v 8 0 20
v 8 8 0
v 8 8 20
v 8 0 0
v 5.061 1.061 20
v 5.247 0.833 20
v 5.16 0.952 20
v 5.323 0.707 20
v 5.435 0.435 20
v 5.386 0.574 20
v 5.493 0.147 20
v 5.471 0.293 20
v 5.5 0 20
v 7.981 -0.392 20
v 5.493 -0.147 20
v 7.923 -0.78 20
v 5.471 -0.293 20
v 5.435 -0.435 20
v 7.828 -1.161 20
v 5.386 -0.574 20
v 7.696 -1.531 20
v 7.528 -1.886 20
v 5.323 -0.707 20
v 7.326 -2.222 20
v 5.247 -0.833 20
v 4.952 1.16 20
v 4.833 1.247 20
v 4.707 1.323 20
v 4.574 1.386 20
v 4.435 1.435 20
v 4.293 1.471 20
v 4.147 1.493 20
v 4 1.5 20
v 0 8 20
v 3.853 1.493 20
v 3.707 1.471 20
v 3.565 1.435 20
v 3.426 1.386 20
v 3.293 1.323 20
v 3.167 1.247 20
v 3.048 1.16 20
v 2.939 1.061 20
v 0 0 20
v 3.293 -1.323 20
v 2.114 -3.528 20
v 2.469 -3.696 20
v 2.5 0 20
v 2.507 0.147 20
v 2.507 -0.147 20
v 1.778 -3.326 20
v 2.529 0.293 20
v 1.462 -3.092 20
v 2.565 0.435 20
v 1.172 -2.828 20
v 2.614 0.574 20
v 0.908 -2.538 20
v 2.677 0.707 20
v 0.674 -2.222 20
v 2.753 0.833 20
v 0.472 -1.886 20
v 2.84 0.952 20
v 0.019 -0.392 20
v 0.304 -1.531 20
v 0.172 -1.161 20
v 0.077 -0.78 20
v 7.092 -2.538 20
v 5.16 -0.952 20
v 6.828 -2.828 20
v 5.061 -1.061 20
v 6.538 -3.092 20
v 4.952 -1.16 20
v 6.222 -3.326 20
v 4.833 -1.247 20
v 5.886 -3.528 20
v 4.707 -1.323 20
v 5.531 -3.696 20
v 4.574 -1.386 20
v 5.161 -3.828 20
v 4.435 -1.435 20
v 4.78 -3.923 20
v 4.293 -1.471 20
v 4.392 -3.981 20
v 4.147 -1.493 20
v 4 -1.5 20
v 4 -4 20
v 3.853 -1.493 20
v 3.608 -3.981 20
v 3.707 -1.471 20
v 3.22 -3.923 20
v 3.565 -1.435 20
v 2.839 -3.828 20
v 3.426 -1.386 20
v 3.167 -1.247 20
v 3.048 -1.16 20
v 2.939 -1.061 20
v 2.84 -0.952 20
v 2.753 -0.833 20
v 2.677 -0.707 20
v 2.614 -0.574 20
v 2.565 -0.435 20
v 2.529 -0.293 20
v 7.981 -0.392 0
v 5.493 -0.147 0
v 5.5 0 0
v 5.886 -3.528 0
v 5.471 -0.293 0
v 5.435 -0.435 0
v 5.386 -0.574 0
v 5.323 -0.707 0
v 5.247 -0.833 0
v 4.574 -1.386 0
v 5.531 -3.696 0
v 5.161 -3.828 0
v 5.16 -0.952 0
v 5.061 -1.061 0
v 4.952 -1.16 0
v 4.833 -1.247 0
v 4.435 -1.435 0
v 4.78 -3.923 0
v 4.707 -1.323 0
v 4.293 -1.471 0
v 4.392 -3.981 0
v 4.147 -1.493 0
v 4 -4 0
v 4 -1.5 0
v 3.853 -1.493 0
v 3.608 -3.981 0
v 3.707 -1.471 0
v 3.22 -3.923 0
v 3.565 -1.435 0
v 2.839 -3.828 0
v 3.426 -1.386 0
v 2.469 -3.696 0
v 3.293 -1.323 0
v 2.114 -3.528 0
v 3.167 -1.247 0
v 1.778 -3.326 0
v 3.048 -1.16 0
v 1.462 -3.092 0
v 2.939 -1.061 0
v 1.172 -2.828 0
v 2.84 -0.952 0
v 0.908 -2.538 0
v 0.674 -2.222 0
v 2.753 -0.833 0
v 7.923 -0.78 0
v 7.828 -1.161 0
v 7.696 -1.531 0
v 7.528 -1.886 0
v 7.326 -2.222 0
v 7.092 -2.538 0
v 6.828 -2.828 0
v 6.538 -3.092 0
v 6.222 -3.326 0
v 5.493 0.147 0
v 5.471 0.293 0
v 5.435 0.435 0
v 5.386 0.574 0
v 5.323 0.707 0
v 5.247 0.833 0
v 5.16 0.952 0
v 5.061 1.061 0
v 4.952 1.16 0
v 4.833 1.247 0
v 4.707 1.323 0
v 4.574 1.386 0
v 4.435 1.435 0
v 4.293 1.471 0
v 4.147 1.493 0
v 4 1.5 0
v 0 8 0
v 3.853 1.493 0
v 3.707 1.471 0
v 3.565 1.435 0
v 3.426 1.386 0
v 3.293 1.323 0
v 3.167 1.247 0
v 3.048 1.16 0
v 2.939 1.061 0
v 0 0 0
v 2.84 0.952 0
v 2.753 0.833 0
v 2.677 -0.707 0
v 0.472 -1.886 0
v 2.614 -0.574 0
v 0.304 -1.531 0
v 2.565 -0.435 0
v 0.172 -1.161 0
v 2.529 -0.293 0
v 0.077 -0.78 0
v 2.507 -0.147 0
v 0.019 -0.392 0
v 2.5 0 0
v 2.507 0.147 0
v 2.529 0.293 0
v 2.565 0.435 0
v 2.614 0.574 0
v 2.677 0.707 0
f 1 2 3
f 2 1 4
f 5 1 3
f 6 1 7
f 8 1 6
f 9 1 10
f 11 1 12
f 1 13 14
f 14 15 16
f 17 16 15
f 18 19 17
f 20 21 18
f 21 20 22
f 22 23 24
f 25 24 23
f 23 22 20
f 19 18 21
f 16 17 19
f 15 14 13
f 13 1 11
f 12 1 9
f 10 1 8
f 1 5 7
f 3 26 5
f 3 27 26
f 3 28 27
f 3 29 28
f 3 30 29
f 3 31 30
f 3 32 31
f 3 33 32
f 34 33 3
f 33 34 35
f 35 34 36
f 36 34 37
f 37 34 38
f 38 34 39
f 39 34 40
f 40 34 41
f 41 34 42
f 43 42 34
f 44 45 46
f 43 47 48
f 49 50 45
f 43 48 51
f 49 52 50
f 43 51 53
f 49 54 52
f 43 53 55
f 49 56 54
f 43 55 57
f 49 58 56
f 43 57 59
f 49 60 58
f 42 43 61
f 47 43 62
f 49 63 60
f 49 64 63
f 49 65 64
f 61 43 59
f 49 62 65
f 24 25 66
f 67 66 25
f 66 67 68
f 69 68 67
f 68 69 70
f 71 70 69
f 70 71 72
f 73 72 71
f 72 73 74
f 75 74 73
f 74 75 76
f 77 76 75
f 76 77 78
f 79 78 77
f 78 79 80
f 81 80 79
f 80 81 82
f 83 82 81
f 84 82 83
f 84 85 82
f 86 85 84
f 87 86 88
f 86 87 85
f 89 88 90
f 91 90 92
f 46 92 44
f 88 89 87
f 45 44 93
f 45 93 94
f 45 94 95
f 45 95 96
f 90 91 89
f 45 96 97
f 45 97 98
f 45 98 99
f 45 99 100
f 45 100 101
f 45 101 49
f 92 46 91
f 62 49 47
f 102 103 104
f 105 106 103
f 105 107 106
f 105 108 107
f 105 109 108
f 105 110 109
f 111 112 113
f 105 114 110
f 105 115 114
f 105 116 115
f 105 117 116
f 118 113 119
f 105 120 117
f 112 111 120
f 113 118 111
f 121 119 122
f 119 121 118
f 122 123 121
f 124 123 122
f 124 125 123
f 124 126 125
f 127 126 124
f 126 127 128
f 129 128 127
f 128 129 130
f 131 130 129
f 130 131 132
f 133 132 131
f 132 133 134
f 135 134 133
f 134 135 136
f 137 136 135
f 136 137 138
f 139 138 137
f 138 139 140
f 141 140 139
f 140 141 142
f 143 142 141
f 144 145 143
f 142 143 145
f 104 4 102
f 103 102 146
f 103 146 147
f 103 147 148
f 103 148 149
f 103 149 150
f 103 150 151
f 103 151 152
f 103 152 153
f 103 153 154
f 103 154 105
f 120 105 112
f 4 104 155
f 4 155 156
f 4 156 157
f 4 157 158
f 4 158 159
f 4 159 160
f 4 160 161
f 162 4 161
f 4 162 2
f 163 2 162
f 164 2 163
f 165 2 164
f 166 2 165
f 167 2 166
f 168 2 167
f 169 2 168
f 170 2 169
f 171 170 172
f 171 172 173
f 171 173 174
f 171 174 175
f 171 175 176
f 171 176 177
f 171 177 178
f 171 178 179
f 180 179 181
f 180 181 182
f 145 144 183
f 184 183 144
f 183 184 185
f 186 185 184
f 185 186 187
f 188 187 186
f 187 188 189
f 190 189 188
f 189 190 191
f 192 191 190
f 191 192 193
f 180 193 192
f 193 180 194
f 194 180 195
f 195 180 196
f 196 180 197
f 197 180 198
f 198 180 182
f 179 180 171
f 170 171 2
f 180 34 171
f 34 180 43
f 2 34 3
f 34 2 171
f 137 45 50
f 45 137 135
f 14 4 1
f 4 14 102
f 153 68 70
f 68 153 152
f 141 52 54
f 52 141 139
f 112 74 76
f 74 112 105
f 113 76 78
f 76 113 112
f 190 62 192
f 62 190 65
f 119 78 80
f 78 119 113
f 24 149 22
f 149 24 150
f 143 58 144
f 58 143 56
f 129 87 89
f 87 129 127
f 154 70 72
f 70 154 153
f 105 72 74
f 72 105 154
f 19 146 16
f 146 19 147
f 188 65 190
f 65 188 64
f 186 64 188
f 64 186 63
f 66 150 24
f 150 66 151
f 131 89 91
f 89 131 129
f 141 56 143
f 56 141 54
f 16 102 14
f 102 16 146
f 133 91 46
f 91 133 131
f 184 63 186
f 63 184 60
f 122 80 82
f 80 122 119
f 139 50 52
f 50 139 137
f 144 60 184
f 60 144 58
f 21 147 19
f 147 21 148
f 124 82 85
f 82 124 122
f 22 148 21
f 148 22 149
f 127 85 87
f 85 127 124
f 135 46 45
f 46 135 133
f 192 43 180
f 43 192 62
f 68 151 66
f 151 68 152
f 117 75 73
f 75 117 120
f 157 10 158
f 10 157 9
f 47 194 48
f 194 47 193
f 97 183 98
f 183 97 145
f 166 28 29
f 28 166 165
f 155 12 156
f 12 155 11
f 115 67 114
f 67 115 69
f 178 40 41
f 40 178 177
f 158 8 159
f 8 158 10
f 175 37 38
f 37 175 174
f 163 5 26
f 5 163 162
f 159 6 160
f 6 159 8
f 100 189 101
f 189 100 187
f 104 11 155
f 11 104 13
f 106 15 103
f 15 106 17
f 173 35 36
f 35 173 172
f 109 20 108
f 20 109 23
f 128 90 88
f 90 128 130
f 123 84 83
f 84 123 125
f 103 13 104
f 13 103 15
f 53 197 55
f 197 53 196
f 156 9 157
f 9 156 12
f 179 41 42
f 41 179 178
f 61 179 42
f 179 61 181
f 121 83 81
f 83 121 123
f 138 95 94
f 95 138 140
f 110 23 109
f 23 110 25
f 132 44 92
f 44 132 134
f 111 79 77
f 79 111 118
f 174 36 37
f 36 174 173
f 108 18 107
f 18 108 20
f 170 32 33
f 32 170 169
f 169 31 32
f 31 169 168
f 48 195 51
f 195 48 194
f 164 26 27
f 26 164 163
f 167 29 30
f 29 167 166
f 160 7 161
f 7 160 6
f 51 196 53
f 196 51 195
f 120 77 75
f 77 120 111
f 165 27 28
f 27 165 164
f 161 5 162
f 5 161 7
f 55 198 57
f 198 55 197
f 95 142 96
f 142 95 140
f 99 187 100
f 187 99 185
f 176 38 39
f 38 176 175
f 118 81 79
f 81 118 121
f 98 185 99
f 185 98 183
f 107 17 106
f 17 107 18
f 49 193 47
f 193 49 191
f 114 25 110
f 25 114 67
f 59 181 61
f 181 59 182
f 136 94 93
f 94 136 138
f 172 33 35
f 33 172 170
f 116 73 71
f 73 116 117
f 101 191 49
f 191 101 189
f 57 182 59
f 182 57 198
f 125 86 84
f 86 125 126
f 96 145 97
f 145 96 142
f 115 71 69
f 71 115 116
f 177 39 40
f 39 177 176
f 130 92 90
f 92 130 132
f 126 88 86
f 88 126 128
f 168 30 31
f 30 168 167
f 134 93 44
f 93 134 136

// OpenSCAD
$fn=64;

module feste() {
    difference() {
        union() {
            cube([8,8,20]);
            translate([4,0,0]) {
                cylinder(h=20,d=8);
            }
        }
        translate([4,0,0]) {
            cylinder(h=20,d=3);
        }        
    } 
}

feste();
